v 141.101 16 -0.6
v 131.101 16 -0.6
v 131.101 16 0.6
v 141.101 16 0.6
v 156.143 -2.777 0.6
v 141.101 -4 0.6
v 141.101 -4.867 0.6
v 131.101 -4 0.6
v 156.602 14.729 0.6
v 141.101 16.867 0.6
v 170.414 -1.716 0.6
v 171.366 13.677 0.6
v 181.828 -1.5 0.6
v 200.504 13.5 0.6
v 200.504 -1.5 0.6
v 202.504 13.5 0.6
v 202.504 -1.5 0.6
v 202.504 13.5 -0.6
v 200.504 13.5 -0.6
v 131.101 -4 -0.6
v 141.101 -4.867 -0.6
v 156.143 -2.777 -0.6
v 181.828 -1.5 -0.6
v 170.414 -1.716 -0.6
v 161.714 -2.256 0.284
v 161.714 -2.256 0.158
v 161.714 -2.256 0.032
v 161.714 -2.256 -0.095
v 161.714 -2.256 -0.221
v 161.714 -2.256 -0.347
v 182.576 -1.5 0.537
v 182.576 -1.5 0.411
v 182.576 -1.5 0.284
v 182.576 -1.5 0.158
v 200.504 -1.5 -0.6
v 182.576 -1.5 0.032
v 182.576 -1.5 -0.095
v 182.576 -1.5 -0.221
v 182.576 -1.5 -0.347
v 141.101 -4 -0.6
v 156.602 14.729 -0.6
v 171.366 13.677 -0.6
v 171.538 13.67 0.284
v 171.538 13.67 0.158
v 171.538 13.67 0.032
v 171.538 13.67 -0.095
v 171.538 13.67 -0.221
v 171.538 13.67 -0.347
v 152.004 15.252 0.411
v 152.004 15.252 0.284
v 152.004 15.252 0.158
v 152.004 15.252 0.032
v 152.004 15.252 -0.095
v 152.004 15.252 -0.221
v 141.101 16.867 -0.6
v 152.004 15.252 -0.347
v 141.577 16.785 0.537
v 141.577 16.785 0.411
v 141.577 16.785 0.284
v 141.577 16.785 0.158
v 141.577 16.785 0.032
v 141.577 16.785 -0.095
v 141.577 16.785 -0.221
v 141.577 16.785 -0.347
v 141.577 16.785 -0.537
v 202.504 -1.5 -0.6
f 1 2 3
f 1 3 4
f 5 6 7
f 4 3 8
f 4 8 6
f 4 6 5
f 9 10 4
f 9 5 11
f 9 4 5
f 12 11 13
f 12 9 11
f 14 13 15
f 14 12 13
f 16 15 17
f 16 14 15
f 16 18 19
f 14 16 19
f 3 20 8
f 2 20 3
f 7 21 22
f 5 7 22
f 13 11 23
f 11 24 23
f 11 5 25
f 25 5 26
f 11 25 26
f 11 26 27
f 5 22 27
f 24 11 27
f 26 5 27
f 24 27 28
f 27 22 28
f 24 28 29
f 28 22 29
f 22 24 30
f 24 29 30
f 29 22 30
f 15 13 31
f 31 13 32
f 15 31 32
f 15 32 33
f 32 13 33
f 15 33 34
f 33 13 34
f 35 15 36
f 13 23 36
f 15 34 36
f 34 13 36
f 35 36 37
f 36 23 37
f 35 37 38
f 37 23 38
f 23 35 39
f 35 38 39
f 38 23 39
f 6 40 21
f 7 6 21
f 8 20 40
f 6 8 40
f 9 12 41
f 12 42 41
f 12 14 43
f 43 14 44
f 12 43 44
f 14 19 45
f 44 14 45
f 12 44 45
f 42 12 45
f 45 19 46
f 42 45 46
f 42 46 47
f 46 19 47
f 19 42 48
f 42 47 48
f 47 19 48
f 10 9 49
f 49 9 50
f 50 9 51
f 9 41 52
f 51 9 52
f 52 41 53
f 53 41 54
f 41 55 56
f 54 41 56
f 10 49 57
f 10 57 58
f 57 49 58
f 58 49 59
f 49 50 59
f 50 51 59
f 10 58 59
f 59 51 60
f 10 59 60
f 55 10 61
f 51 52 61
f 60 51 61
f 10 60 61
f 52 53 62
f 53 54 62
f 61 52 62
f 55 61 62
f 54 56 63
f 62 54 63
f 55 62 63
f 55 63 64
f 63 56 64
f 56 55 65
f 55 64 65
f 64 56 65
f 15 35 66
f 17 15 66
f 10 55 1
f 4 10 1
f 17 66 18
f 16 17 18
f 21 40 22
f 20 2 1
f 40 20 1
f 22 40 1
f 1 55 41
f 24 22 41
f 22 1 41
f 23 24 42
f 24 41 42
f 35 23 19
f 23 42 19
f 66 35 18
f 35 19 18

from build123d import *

# Parameters (mm, degrees)
BOSS_EXTRUDE1_DEPTH      = 0.6
BOSS_EXTRUDE1_DEPTH_BACK = 0.6


with BuildPart() as part:
    # Sketch2 → Boss-Extrude1 (new, two sides: drawn at the far end of the back side and taken through both)
    with BuildSketch(Plane.XY.offset(-BOSS_EXTRUDE1_DEPTH_BACK)):
        with BuildLine():
            Line((202.50370257, 13.5), (200.50370257, 13.5))
            add(Edge.make_bspline(
                [(200.50370257, 13.5), (199.074917608, 13.5), (196.922682113, 13.499999988), (194.089266991, 13.50000002), (191.634138002, 13.499999925), (189.047662174, 13.500000282), (185.720042457, 13.499998504), (183.067579699, 13.500009344), (180.929013684, 13.499984023), (179.048732059, 13.500086521), (176.736526724, 13.523104421), (174.091882285, 13.580347526), (171.527736211, 13.665821528), (169.025206506, 13.776285946), (165.740597936, 13.955169806), (161.70908639, 14.239854658), (156.900354592, 14.680391927), (152.026473921, 15.232042325), (147.01490053, 15.903383768), (143.285295207, 16.49131543), (141.26029798, 16.839114396), (141.101357243, 16.866582901)],
                knots=[0.016413233, 0.016413233, 0.016413233, 0.016413233, 0.024097505, 0.02793964, 0.031781776, 0.035623912, 0.039466048, 0.04715032, 0.050992455, 0.054834591, 0.062518863, 0.070203134, 0.077887406, 0.085571678, 0.093255949, 0.108624492, 0.123993036, 0.139361579, 0.154730122, 0.170098665, 0.171403342, 0.171403342, 0.171403342, 0.171403342], degree=3))
            Line((141.101357243, 16.866582901), (141.101357243, 16))
            Line((141.101357243, 16), (131.101357243, 16))
            Line((131.101357243, 16), (131.101357243, -4))
            Line((131.101357243, -4), (141.101357243, -4))
            Line((141.101357243, -4), (141.101357243, -4.866582901))
            add(Edge.make_bspline(
                [(141.101357243, -4.866582901), (141.26029798, -4.839114396), (143.285295207, -4.49131543), (147.01490053, -3.903383768), (152.026473921, -3.232042325), (156.900354592, -2.680391927), (161.70908639, -2.239854658), (165.740597936, -1.955169806), (169.025206506, -1.776285946), (171.527736211, -1.665821528), (174.091882285, -1.580347526), (176.736526724, -1.523104421), (179.048732059, -1.500086521), (180.929013684, -1.499984023), (183.067579699, -1.500009344), (185.720042457, -1.499998504), (189.047662174, -1.500000282), (191.634138002, -1.499999925), (194.089266991, -1.50000002), (196.922682113, -1.499999988), (199.074917608, -1.5), (200.50370257, -1.5)],
                knots=[0.845009891, 0.845009891, 0.845009891, 0.845009891, 0.846314568, 0.861683111, 0.877051654, 0.892420197, 0.907788741, 0.923157284, 0.930841555, 0.938525827, 0.946210099, 0.95389437, 0.961578642, 0.965420778, 0.969262914, 0.976947185, 0.980789321, 0.984631457, 0.988473593, 0.992315728, 1, 1, 1, 1], degree=3))
            Line((200.50370257, -1.5), (202.50370257, -1.5))
            Line((202.50370257, -1.5), (202.50370257, 13.5))
        make_face()
    extrude(amount=BOSS_EXTRUDE1_DEPTH + BOSS_EXTRUDE1_DEPTH_BACK)


solid = part.part
